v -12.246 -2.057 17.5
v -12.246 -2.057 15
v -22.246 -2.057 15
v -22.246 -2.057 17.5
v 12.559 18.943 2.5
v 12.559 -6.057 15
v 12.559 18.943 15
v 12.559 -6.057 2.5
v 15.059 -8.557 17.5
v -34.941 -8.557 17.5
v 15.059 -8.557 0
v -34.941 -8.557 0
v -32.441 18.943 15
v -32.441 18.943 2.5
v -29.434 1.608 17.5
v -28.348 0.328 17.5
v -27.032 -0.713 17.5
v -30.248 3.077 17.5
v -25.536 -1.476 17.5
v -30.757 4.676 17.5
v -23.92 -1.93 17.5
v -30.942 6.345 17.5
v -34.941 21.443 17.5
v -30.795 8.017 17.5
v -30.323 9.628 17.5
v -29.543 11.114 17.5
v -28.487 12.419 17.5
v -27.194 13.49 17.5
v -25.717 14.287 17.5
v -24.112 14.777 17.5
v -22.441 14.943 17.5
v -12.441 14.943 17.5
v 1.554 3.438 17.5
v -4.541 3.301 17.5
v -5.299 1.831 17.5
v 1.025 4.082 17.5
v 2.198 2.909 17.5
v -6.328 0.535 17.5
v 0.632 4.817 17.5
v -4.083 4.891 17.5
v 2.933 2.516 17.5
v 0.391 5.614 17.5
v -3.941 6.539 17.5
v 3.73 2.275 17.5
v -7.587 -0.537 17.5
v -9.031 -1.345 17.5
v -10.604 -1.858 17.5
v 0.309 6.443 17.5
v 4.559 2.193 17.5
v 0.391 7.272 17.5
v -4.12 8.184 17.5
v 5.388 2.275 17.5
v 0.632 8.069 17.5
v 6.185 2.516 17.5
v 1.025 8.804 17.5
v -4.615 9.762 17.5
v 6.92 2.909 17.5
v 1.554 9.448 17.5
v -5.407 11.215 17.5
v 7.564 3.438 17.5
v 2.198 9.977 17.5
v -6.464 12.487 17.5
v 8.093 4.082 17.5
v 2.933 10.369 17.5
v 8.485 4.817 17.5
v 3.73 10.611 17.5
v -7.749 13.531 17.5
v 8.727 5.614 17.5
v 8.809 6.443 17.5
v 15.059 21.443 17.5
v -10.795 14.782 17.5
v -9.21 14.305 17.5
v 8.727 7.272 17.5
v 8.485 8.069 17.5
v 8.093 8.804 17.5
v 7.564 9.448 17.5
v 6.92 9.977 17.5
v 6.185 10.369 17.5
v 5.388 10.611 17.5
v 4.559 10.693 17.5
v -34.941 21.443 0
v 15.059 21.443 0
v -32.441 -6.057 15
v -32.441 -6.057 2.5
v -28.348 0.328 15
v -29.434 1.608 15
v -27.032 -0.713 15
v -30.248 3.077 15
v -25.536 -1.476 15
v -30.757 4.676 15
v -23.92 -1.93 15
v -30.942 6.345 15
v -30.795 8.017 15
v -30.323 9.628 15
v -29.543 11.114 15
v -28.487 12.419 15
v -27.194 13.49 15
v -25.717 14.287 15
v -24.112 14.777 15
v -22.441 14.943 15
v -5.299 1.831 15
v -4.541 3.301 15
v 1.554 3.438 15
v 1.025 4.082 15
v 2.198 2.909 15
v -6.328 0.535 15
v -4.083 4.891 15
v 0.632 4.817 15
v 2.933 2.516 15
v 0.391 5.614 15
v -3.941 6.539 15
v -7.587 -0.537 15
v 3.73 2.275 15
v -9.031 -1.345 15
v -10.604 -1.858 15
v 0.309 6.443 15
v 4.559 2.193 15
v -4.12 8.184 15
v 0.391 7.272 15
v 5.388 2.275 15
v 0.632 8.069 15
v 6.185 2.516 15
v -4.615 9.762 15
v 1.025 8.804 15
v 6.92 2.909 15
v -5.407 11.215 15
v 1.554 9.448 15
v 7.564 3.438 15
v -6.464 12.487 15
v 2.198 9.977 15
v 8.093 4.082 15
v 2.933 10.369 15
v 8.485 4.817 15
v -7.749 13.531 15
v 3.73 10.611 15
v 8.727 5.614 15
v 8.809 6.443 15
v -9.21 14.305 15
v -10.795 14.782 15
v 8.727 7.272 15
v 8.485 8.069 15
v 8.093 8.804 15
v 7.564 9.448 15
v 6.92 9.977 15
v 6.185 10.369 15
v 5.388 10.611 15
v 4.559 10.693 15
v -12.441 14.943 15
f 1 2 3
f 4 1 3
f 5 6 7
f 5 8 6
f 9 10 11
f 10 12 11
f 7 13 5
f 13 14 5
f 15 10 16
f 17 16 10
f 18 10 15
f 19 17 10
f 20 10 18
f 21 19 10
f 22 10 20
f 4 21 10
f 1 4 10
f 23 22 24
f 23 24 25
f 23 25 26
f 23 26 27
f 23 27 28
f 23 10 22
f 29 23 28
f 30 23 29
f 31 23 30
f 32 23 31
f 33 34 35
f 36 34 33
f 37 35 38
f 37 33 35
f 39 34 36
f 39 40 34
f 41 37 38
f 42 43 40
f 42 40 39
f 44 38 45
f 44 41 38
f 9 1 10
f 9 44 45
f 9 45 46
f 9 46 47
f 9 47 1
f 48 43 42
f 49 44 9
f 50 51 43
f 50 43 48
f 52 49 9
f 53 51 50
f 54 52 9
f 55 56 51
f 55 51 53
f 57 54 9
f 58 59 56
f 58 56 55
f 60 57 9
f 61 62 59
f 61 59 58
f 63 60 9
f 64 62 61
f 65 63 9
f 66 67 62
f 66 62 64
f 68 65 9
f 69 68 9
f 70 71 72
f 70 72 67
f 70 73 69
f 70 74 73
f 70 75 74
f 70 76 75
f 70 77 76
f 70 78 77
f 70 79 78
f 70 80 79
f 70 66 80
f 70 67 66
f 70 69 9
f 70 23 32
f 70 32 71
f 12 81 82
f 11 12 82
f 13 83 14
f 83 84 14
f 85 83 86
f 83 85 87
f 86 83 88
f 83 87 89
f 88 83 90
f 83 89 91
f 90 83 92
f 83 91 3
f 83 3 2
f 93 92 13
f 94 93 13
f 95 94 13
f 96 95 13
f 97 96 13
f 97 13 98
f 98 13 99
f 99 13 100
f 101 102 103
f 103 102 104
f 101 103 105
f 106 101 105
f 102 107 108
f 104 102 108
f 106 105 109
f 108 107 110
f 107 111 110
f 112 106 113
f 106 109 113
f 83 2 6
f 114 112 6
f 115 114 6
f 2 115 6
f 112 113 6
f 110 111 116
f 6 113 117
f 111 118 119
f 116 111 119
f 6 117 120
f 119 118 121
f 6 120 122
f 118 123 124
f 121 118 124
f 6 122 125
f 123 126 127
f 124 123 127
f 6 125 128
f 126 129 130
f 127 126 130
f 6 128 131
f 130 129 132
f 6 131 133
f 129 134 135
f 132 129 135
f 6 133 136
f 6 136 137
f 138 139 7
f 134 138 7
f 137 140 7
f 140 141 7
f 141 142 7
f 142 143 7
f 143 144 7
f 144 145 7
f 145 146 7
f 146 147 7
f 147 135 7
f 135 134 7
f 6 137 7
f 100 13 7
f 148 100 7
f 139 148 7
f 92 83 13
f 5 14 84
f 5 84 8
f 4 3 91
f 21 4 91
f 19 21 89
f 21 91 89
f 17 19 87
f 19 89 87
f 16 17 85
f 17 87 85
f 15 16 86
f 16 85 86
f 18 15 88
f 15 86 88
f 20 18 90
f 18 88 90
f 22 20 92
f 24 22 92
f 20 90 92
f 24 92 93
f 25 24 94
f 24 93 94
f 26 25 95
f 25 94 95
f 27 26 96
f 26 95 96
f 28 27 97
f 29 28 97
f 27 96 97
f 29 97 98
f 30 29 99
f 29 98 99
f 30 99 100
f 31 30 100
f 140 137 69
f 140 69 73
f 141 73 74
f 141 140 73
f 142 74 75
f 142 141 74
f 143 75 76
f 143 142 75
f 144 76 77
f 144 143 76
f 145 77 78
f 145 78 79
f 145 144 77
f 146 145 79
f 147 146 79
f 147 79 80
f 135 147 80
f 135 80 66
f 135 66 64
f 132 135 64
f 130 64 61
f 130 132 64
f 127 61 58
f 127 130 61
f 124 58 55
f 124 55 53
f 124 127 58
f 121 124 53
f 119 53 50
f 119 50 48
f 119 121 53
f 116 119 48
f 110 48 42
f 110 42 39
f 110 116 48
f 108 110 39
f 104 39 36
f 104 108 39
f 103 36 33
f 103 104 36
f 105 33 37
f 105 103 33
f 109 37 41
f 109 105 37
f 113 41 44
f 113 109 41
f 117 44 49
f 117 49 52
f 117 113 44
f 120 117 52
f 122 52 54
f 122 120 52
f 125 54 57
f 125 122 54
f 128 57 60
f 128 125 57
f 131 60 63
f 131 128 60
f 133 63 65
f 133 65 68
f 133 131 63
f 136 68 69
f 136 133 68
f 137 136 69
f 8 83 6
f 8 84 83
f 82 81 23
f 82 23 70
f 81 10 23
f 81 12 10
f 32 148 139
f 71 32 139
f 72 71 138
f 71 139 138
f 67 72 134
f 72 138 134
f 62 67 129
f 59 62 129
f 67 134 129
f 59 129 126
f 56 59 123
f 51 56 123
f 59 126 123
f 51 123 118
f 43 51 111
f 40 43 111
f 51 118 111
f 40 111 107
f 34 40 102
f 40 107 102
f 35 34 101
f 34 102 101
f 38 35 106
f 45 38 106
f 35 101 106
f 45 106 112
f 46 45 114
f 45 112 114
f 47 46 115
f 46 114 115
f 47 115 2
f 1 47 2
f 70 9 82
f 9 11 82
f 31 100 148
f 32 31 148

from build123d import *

# Parameters (mm, degrees)
F0_W     = 50
F0_H     = 30
F1_DEPTH = 15
F2_T     = -2.5
F3_W     = 50
F3_H     = 30
F3_R     = 4.25
F4_DEPTH = 2.5


with BuildPart() as f1:
    # F0 (on Top) → F1 (new body)
    with BuildSketch(Plane.XY):
        with Locations((-9.941086, 6.442985)):
            Rectangle(F0_W, F0_H)
    extrude(amount=F1_DEPTH)

    # F2
    f2_openings = [f1.faces().sort_by_distance(p)[0] for p in [
        (-9.941086, 6.442985, 15),
    ]]
    offset(amount=F2_T, openings=f2_openings)

    # F3 (on face) → F4 (join)
    with BuildSketch(Plane.XY.offset(15)):
        with Locations((-9.941086, 6.442985)):
            Rectangle(F3_W, F3_H)
        with BuildLine():
            ThreePointArc((-22.246402, -2.057015), (-30.941643, 6.344522), (-22.441086, 14.942985))
            Line((-22.441086, 14.942985), (-12.441086, 14.942985))
            ThreePointArc((-12.441086, 14.942985), (-3.940528, 6.539219), (-12.246402, -2.057015))
            Line((-12.246402, -2.057015), (-22.246402, -2.057015))
        make_face(mode=Mode.SUBTRACT)
        with Locations((4.558914, 6.442985)):
            Circle(F3_R, mode=Mode.SUBTRACT)
    extrude(amount=F4_DEPTH)


solid = f1.part
